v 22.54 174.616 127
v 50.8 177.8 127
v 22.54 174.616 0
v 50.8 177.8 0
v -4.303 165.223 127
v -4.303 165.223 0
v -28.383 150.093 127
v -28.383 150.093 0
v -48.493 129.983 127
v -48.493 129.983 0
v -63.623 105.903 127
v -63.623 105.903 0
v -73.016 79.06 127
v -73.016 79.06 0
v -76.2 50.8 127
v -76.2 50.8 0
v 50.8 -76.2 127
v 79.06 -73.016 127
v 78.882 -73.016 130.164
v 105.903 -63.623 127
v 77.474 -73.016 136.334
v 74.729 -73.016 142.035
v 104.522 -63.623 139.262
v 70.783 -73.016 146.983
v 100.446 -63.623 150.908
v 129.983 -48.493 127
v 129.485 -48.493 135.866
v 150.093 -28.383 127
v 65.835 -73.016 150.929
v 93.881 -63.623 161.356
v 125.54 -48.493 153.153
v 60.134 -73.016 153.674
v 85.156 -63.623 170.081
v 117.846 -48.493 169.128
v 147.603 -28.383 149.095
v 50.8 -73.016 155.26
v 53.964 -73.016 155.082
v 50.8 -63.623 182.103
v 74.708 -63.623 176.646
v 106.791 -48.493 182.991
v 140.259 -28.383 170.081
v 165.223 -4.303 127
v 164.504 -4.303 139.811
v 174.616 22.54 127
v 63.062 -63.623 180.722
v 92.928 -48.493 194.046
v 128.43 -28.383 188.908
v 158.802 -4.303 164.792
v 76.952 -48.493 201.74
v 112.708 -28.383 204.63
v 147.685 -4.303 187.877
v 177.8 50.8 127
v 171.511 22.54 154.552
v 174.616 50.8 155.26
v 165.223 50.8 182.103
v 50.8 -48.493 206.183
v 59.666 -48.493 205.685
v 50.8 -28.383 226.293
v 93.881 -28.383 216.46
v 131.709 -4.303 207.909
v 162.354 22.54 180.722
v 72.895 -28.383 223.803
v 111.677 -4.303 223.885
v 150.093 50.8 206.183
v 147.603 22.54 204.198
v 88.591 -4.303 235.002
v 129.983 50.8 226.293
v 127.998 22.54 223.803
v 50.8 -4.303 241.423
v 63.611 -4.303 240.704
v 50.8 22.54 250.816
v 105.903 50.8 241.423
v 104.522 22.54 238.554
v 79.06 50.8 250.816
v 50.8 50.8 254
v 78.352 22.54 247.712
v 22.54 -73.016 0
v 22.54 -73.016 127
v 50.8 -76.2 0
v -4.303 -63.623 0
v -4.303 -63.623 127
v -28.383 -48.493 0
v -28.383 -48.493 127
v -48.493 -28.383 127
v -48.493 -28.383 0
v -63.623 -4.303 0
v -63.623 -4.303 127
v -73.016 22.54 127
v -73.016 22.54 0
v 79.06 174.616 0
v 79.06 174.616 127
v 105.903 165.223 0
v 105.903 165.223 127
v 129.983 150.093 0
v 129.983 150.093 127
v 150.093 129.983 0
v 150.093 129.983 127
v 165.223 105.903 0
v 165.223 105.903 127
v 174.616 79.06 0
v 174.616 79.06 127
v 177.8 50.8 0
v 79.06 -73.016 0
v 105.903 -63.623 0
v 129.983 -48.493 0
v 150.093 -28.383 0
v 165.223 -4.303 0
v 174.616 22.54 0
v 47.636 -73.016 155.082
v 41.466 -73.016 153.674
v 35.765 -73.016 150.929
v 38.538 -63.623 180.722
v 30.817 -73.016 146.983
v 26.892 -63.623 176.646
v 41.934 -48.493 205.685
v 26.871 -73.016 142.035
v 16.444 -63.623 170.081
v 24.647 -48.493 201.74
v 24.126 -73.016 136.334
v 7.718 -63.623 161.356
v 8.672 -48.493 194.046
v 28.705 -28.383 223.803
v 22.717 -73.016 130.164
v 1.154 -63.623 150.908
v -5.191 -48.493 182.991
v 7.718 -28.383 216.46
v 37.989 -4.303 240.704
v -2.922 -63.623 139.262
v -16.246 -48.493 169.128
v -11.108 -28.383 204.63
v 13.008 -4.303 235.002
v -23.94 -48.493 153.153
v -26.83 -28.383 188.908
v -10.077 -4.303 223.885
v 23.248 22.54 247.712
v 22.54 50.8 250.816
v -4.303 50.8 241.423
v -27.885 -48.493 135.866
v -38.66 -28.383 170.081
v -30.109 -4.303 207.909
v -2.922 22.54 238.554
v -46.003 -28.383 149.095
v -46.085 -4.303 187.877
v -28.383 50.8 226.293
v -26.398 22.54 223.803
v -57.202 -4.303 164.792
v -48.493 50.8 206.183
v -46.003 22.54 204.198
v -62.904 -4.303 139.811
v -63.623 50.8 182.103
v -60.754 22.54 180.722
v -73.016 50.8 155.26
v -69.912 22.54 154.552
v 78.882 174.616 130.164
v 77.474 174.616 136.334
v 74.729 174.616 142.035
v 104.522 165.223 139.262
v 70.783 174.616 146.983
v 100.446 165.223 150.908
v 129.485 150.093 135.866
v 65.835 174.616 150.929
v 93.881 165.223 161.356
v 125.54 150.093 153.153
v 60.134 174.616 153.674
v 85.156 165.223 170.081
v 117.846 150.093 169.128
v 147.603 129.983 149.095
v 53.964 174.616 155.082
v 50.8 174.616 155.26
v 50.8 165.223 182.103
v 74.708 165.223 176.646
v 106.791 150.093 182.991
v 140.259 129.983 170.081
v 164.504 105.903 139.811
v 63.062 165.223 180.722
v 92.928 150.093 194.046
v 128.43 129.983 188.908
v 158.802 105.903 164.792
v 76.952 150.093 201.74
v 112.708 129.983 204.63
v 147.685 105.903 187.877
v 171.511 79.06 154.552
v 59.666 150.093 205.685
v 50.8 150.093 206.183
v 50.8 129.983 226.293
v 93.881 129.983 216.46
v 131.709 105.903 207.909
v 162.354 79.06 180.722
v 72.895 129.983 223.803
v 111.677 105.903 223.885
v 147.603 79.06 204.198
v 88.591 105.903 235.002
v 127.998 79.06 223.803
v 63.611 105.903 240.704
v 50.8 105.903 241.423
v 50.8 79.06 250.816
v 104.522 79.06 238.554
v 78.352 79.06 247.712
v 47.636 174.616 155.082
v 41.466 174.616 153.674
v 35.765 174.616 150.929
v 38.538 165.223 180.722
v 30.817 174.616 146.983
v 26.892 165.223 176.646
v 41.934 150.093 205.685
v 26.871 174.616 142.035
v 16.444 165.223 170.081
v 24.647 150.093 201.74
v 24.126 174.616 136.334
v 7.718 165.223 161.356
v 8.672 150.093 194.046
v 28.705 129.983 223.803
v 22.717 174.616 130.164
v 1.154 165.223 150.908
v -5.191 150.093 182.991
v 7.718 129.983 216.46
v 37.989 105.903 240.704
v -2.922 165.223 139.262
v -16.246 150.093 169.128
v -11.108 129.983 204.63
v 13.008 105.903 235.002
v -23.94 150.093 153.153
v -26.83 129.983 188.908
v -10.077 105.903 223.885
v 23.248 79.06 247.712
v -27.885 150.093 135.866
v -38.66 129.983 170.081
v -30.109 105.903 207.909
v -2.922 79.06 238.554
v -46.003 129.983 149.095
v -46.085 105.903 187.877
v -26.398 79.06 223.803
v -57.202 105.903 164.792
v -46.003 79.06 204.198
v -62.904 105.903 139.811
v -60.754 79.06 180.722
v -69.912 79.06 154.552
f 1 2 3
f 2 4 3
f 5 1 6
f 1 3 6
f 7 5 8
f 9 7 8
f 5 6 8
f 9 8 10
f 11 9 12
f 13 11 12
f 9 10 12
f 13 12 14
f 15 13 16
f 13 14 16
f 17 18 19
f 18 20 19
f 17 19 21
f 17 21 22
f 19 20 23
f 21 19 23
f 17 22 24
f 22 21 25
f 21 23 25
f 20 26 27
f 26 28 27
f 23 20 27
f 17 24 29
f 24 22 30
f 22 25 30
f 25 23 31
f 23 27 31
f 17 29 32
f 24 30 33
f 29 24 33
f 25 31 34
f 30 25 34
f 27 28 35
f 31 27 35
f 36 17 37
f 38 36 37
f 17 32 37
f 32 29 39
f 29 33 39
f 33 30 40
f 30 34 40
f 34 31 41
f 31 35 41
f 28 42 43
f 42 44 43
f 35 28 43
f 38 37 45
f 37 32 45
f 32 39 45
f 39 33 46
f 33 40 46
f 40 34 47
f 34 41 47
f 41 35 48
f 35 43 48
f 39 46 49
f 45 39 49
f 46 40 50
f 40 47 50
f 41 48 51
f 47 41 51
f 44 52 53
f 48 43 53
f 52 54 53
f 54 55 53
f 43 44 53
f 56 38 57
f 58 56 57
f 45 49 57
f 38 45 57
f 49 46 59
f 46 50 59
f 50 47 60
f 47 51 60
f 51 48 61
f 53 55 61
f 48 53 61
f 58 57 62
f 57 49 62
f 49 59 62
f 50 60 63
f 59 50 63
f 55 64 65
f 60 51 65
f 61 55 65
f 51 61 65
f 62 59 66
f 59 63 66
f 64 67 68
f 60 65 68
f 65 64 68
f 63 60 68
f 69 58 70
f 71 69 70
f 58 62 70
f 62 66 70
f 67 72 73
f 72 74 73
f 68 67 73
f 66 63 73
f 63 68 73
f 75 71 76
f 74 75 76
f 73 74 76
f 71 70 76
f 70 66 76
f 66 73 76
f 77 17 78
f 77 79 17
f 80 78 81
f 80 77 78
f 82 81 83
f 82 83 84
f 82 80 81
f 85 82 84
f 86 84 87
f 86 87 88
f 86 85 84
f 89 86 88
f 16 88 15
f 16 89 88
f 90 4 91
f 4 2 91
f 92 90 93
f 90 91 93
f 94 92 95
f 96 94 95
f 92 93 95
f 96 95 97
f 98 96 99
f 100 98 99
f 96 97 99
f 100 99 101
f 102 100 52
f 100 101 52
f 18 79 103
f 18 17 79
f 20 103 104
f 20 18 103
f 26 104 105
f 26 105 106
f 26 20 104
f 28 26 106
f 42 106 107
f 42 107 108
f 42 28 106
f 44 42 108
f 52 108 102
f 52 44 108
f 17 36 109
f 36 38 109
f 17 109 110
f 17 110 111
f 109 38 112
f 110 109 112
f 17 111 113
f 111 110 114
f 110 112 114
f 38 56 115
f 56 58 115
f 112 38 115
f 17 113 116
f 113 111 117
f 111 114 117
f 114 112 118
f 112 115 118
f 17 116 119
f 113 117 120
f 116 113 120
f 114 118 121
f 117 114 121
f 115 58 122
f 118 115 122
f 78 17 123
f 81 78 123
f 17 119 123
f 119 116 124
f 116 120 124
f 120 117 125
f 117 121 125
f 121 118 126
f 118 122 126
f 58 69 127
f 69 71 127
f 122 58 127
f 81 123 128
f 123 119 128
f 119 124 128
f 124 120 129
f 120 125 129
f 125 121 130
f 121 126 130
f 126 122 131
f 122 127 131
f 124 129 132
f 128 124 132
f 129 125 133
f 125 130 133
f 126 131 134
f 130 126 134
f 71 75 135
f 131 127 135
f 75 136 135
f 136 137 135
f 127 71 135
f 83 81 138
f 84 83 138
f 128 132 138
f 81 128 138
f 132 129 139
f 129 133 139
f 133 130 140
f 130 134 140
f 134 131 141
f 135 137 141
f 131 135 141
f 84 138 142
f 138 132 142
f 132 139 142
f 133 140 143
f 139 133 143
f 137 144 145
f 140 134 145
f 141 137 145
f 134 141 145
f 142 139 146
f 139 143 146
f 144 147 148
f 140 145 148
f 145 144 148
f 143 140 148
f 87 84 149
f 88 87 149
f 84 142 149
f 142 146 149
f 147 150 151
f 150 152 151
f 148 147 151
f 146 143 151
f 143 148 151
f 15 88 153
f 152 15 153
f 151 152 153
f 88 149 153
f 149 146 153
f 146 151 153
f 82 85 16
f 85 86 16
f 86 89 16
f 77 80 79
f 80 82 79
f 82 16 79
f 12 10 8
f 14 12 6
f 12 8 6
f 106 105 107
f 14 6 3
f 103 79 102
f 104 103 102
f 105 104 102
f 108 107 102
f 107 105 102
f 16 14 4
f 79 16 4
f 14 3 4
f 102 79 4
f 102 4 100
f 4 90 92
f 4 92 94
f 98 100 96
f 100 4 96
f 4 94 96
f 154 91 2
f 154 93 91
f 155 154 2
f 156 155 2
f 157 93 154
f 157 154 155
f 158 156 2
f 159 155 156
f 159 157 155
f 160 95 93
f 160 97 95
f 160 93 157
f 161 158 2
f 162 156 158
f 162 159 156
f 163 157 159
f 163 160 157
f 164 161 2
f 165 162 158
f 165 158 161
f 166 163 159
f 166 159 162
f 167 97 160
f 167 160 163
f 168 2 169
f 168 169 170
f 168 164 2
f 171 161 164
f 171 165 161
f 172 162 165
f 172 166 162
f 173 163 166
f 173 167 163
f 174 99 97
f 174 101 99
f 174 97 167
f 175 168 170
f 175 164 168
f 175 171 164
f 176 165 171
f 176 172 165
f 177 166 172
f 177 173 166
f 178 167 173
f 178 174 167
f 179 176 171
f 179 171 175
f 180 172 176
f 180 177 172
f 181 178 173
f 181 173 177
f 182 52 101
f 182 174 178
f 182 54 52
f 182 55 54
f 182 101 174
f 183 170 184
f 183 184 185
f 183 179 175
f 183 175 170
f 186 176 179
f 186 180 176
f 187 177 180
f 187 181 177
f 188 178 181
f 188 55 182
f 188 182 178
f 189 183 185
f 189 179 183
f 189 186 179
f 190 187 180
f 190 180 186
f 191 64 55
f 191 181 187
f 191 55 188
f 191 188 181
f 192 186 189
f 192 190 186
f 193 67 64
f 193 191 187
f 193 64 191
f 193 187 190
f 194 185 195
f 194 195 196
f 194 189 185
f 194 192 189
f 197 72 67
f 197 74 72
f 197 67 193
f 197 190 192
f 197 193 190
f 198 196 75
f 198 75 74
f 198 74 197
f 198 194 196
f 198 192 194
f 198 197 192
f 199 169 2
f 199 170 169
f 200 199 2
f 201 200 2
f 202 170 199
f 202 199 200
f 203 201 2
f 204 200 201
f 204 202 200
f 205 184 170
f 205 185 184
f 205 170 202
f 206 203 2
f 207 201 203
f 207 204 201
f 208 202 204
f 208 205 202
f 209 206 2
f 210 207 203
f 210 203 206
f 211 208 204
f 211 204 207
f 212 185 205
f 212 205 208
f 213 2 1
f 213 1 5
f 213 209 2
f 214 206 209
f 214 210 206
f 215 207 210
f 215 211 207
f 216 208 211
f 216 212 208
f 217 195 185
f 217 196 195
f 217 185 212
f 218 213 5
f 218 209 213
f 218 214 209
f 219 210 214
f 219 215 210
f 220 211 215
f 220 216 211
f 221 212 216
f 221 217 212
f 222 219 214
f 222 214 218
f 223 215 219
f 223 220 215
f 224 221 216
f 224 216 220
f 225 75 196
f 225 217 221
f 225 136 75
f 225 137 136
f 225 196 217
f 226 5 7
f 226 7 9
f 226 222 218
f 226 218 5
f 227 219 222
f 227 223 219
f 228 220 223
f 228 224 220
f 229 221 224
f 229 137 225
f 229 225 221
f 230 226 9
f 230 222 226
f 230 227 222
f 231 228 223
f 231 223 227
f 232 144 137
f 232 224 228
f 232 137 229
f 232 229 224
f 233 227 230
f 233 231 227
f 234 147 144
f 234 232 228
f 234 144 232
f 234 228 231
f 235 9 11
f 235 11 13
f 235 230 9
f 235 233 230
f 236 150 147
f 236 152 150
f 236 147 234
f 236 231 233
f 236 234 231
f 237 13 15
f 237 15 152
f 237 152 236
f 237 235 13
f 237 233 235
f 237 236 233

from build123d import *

# Parameters (mm, degrees)
F0_W     = 254
F0_H     = 254
F1_DEPTH = 254
F2_R     = 126.99999
F3_R     = 126.99999


# Not quite as in the source:
# - a fillet or chamfer is up to 0.001 mm smaller than in the source, because OpenCascade refuses the exact size


with BuildPart() as f1:
    # F0 (on Top) → F1 (new body)
    with BuildSketch(Plane.XY):
        with Locations((50.79993667, 50.8000484288)):
            Rectangle(F0_W, F0_H)
    extrude(amount=F1_DEPTH)

    # F2 (radius 127 in the source; OpenCascade refuses exactly that, so slightly less here)
    f2_edges = [f1.edges().sort_by_distance(p)[0] for p in [
        (-76.200063, 50.800048, 254),
        (177.799937, 50.800048, 254),
    ]]
    fillet(f2_edges, radius=F2_R)

    # F3 (radius 127 in the source; OpenCascade refuses exactly that, so slightly less here)
    f3_edges = [f1.edges().sort_by_distance(p)[0] for p in [
        (140.602501, 177.800048, 216.802564),
        (177.799937, 177.800048, 63.500005),
        (-76.200063, 177.800048, 63.500005),
        (140.602501, -76.199952, 216.802564),
    ]]
    fillet(f3_edges, radius=F3_R)


solid = f1.part
